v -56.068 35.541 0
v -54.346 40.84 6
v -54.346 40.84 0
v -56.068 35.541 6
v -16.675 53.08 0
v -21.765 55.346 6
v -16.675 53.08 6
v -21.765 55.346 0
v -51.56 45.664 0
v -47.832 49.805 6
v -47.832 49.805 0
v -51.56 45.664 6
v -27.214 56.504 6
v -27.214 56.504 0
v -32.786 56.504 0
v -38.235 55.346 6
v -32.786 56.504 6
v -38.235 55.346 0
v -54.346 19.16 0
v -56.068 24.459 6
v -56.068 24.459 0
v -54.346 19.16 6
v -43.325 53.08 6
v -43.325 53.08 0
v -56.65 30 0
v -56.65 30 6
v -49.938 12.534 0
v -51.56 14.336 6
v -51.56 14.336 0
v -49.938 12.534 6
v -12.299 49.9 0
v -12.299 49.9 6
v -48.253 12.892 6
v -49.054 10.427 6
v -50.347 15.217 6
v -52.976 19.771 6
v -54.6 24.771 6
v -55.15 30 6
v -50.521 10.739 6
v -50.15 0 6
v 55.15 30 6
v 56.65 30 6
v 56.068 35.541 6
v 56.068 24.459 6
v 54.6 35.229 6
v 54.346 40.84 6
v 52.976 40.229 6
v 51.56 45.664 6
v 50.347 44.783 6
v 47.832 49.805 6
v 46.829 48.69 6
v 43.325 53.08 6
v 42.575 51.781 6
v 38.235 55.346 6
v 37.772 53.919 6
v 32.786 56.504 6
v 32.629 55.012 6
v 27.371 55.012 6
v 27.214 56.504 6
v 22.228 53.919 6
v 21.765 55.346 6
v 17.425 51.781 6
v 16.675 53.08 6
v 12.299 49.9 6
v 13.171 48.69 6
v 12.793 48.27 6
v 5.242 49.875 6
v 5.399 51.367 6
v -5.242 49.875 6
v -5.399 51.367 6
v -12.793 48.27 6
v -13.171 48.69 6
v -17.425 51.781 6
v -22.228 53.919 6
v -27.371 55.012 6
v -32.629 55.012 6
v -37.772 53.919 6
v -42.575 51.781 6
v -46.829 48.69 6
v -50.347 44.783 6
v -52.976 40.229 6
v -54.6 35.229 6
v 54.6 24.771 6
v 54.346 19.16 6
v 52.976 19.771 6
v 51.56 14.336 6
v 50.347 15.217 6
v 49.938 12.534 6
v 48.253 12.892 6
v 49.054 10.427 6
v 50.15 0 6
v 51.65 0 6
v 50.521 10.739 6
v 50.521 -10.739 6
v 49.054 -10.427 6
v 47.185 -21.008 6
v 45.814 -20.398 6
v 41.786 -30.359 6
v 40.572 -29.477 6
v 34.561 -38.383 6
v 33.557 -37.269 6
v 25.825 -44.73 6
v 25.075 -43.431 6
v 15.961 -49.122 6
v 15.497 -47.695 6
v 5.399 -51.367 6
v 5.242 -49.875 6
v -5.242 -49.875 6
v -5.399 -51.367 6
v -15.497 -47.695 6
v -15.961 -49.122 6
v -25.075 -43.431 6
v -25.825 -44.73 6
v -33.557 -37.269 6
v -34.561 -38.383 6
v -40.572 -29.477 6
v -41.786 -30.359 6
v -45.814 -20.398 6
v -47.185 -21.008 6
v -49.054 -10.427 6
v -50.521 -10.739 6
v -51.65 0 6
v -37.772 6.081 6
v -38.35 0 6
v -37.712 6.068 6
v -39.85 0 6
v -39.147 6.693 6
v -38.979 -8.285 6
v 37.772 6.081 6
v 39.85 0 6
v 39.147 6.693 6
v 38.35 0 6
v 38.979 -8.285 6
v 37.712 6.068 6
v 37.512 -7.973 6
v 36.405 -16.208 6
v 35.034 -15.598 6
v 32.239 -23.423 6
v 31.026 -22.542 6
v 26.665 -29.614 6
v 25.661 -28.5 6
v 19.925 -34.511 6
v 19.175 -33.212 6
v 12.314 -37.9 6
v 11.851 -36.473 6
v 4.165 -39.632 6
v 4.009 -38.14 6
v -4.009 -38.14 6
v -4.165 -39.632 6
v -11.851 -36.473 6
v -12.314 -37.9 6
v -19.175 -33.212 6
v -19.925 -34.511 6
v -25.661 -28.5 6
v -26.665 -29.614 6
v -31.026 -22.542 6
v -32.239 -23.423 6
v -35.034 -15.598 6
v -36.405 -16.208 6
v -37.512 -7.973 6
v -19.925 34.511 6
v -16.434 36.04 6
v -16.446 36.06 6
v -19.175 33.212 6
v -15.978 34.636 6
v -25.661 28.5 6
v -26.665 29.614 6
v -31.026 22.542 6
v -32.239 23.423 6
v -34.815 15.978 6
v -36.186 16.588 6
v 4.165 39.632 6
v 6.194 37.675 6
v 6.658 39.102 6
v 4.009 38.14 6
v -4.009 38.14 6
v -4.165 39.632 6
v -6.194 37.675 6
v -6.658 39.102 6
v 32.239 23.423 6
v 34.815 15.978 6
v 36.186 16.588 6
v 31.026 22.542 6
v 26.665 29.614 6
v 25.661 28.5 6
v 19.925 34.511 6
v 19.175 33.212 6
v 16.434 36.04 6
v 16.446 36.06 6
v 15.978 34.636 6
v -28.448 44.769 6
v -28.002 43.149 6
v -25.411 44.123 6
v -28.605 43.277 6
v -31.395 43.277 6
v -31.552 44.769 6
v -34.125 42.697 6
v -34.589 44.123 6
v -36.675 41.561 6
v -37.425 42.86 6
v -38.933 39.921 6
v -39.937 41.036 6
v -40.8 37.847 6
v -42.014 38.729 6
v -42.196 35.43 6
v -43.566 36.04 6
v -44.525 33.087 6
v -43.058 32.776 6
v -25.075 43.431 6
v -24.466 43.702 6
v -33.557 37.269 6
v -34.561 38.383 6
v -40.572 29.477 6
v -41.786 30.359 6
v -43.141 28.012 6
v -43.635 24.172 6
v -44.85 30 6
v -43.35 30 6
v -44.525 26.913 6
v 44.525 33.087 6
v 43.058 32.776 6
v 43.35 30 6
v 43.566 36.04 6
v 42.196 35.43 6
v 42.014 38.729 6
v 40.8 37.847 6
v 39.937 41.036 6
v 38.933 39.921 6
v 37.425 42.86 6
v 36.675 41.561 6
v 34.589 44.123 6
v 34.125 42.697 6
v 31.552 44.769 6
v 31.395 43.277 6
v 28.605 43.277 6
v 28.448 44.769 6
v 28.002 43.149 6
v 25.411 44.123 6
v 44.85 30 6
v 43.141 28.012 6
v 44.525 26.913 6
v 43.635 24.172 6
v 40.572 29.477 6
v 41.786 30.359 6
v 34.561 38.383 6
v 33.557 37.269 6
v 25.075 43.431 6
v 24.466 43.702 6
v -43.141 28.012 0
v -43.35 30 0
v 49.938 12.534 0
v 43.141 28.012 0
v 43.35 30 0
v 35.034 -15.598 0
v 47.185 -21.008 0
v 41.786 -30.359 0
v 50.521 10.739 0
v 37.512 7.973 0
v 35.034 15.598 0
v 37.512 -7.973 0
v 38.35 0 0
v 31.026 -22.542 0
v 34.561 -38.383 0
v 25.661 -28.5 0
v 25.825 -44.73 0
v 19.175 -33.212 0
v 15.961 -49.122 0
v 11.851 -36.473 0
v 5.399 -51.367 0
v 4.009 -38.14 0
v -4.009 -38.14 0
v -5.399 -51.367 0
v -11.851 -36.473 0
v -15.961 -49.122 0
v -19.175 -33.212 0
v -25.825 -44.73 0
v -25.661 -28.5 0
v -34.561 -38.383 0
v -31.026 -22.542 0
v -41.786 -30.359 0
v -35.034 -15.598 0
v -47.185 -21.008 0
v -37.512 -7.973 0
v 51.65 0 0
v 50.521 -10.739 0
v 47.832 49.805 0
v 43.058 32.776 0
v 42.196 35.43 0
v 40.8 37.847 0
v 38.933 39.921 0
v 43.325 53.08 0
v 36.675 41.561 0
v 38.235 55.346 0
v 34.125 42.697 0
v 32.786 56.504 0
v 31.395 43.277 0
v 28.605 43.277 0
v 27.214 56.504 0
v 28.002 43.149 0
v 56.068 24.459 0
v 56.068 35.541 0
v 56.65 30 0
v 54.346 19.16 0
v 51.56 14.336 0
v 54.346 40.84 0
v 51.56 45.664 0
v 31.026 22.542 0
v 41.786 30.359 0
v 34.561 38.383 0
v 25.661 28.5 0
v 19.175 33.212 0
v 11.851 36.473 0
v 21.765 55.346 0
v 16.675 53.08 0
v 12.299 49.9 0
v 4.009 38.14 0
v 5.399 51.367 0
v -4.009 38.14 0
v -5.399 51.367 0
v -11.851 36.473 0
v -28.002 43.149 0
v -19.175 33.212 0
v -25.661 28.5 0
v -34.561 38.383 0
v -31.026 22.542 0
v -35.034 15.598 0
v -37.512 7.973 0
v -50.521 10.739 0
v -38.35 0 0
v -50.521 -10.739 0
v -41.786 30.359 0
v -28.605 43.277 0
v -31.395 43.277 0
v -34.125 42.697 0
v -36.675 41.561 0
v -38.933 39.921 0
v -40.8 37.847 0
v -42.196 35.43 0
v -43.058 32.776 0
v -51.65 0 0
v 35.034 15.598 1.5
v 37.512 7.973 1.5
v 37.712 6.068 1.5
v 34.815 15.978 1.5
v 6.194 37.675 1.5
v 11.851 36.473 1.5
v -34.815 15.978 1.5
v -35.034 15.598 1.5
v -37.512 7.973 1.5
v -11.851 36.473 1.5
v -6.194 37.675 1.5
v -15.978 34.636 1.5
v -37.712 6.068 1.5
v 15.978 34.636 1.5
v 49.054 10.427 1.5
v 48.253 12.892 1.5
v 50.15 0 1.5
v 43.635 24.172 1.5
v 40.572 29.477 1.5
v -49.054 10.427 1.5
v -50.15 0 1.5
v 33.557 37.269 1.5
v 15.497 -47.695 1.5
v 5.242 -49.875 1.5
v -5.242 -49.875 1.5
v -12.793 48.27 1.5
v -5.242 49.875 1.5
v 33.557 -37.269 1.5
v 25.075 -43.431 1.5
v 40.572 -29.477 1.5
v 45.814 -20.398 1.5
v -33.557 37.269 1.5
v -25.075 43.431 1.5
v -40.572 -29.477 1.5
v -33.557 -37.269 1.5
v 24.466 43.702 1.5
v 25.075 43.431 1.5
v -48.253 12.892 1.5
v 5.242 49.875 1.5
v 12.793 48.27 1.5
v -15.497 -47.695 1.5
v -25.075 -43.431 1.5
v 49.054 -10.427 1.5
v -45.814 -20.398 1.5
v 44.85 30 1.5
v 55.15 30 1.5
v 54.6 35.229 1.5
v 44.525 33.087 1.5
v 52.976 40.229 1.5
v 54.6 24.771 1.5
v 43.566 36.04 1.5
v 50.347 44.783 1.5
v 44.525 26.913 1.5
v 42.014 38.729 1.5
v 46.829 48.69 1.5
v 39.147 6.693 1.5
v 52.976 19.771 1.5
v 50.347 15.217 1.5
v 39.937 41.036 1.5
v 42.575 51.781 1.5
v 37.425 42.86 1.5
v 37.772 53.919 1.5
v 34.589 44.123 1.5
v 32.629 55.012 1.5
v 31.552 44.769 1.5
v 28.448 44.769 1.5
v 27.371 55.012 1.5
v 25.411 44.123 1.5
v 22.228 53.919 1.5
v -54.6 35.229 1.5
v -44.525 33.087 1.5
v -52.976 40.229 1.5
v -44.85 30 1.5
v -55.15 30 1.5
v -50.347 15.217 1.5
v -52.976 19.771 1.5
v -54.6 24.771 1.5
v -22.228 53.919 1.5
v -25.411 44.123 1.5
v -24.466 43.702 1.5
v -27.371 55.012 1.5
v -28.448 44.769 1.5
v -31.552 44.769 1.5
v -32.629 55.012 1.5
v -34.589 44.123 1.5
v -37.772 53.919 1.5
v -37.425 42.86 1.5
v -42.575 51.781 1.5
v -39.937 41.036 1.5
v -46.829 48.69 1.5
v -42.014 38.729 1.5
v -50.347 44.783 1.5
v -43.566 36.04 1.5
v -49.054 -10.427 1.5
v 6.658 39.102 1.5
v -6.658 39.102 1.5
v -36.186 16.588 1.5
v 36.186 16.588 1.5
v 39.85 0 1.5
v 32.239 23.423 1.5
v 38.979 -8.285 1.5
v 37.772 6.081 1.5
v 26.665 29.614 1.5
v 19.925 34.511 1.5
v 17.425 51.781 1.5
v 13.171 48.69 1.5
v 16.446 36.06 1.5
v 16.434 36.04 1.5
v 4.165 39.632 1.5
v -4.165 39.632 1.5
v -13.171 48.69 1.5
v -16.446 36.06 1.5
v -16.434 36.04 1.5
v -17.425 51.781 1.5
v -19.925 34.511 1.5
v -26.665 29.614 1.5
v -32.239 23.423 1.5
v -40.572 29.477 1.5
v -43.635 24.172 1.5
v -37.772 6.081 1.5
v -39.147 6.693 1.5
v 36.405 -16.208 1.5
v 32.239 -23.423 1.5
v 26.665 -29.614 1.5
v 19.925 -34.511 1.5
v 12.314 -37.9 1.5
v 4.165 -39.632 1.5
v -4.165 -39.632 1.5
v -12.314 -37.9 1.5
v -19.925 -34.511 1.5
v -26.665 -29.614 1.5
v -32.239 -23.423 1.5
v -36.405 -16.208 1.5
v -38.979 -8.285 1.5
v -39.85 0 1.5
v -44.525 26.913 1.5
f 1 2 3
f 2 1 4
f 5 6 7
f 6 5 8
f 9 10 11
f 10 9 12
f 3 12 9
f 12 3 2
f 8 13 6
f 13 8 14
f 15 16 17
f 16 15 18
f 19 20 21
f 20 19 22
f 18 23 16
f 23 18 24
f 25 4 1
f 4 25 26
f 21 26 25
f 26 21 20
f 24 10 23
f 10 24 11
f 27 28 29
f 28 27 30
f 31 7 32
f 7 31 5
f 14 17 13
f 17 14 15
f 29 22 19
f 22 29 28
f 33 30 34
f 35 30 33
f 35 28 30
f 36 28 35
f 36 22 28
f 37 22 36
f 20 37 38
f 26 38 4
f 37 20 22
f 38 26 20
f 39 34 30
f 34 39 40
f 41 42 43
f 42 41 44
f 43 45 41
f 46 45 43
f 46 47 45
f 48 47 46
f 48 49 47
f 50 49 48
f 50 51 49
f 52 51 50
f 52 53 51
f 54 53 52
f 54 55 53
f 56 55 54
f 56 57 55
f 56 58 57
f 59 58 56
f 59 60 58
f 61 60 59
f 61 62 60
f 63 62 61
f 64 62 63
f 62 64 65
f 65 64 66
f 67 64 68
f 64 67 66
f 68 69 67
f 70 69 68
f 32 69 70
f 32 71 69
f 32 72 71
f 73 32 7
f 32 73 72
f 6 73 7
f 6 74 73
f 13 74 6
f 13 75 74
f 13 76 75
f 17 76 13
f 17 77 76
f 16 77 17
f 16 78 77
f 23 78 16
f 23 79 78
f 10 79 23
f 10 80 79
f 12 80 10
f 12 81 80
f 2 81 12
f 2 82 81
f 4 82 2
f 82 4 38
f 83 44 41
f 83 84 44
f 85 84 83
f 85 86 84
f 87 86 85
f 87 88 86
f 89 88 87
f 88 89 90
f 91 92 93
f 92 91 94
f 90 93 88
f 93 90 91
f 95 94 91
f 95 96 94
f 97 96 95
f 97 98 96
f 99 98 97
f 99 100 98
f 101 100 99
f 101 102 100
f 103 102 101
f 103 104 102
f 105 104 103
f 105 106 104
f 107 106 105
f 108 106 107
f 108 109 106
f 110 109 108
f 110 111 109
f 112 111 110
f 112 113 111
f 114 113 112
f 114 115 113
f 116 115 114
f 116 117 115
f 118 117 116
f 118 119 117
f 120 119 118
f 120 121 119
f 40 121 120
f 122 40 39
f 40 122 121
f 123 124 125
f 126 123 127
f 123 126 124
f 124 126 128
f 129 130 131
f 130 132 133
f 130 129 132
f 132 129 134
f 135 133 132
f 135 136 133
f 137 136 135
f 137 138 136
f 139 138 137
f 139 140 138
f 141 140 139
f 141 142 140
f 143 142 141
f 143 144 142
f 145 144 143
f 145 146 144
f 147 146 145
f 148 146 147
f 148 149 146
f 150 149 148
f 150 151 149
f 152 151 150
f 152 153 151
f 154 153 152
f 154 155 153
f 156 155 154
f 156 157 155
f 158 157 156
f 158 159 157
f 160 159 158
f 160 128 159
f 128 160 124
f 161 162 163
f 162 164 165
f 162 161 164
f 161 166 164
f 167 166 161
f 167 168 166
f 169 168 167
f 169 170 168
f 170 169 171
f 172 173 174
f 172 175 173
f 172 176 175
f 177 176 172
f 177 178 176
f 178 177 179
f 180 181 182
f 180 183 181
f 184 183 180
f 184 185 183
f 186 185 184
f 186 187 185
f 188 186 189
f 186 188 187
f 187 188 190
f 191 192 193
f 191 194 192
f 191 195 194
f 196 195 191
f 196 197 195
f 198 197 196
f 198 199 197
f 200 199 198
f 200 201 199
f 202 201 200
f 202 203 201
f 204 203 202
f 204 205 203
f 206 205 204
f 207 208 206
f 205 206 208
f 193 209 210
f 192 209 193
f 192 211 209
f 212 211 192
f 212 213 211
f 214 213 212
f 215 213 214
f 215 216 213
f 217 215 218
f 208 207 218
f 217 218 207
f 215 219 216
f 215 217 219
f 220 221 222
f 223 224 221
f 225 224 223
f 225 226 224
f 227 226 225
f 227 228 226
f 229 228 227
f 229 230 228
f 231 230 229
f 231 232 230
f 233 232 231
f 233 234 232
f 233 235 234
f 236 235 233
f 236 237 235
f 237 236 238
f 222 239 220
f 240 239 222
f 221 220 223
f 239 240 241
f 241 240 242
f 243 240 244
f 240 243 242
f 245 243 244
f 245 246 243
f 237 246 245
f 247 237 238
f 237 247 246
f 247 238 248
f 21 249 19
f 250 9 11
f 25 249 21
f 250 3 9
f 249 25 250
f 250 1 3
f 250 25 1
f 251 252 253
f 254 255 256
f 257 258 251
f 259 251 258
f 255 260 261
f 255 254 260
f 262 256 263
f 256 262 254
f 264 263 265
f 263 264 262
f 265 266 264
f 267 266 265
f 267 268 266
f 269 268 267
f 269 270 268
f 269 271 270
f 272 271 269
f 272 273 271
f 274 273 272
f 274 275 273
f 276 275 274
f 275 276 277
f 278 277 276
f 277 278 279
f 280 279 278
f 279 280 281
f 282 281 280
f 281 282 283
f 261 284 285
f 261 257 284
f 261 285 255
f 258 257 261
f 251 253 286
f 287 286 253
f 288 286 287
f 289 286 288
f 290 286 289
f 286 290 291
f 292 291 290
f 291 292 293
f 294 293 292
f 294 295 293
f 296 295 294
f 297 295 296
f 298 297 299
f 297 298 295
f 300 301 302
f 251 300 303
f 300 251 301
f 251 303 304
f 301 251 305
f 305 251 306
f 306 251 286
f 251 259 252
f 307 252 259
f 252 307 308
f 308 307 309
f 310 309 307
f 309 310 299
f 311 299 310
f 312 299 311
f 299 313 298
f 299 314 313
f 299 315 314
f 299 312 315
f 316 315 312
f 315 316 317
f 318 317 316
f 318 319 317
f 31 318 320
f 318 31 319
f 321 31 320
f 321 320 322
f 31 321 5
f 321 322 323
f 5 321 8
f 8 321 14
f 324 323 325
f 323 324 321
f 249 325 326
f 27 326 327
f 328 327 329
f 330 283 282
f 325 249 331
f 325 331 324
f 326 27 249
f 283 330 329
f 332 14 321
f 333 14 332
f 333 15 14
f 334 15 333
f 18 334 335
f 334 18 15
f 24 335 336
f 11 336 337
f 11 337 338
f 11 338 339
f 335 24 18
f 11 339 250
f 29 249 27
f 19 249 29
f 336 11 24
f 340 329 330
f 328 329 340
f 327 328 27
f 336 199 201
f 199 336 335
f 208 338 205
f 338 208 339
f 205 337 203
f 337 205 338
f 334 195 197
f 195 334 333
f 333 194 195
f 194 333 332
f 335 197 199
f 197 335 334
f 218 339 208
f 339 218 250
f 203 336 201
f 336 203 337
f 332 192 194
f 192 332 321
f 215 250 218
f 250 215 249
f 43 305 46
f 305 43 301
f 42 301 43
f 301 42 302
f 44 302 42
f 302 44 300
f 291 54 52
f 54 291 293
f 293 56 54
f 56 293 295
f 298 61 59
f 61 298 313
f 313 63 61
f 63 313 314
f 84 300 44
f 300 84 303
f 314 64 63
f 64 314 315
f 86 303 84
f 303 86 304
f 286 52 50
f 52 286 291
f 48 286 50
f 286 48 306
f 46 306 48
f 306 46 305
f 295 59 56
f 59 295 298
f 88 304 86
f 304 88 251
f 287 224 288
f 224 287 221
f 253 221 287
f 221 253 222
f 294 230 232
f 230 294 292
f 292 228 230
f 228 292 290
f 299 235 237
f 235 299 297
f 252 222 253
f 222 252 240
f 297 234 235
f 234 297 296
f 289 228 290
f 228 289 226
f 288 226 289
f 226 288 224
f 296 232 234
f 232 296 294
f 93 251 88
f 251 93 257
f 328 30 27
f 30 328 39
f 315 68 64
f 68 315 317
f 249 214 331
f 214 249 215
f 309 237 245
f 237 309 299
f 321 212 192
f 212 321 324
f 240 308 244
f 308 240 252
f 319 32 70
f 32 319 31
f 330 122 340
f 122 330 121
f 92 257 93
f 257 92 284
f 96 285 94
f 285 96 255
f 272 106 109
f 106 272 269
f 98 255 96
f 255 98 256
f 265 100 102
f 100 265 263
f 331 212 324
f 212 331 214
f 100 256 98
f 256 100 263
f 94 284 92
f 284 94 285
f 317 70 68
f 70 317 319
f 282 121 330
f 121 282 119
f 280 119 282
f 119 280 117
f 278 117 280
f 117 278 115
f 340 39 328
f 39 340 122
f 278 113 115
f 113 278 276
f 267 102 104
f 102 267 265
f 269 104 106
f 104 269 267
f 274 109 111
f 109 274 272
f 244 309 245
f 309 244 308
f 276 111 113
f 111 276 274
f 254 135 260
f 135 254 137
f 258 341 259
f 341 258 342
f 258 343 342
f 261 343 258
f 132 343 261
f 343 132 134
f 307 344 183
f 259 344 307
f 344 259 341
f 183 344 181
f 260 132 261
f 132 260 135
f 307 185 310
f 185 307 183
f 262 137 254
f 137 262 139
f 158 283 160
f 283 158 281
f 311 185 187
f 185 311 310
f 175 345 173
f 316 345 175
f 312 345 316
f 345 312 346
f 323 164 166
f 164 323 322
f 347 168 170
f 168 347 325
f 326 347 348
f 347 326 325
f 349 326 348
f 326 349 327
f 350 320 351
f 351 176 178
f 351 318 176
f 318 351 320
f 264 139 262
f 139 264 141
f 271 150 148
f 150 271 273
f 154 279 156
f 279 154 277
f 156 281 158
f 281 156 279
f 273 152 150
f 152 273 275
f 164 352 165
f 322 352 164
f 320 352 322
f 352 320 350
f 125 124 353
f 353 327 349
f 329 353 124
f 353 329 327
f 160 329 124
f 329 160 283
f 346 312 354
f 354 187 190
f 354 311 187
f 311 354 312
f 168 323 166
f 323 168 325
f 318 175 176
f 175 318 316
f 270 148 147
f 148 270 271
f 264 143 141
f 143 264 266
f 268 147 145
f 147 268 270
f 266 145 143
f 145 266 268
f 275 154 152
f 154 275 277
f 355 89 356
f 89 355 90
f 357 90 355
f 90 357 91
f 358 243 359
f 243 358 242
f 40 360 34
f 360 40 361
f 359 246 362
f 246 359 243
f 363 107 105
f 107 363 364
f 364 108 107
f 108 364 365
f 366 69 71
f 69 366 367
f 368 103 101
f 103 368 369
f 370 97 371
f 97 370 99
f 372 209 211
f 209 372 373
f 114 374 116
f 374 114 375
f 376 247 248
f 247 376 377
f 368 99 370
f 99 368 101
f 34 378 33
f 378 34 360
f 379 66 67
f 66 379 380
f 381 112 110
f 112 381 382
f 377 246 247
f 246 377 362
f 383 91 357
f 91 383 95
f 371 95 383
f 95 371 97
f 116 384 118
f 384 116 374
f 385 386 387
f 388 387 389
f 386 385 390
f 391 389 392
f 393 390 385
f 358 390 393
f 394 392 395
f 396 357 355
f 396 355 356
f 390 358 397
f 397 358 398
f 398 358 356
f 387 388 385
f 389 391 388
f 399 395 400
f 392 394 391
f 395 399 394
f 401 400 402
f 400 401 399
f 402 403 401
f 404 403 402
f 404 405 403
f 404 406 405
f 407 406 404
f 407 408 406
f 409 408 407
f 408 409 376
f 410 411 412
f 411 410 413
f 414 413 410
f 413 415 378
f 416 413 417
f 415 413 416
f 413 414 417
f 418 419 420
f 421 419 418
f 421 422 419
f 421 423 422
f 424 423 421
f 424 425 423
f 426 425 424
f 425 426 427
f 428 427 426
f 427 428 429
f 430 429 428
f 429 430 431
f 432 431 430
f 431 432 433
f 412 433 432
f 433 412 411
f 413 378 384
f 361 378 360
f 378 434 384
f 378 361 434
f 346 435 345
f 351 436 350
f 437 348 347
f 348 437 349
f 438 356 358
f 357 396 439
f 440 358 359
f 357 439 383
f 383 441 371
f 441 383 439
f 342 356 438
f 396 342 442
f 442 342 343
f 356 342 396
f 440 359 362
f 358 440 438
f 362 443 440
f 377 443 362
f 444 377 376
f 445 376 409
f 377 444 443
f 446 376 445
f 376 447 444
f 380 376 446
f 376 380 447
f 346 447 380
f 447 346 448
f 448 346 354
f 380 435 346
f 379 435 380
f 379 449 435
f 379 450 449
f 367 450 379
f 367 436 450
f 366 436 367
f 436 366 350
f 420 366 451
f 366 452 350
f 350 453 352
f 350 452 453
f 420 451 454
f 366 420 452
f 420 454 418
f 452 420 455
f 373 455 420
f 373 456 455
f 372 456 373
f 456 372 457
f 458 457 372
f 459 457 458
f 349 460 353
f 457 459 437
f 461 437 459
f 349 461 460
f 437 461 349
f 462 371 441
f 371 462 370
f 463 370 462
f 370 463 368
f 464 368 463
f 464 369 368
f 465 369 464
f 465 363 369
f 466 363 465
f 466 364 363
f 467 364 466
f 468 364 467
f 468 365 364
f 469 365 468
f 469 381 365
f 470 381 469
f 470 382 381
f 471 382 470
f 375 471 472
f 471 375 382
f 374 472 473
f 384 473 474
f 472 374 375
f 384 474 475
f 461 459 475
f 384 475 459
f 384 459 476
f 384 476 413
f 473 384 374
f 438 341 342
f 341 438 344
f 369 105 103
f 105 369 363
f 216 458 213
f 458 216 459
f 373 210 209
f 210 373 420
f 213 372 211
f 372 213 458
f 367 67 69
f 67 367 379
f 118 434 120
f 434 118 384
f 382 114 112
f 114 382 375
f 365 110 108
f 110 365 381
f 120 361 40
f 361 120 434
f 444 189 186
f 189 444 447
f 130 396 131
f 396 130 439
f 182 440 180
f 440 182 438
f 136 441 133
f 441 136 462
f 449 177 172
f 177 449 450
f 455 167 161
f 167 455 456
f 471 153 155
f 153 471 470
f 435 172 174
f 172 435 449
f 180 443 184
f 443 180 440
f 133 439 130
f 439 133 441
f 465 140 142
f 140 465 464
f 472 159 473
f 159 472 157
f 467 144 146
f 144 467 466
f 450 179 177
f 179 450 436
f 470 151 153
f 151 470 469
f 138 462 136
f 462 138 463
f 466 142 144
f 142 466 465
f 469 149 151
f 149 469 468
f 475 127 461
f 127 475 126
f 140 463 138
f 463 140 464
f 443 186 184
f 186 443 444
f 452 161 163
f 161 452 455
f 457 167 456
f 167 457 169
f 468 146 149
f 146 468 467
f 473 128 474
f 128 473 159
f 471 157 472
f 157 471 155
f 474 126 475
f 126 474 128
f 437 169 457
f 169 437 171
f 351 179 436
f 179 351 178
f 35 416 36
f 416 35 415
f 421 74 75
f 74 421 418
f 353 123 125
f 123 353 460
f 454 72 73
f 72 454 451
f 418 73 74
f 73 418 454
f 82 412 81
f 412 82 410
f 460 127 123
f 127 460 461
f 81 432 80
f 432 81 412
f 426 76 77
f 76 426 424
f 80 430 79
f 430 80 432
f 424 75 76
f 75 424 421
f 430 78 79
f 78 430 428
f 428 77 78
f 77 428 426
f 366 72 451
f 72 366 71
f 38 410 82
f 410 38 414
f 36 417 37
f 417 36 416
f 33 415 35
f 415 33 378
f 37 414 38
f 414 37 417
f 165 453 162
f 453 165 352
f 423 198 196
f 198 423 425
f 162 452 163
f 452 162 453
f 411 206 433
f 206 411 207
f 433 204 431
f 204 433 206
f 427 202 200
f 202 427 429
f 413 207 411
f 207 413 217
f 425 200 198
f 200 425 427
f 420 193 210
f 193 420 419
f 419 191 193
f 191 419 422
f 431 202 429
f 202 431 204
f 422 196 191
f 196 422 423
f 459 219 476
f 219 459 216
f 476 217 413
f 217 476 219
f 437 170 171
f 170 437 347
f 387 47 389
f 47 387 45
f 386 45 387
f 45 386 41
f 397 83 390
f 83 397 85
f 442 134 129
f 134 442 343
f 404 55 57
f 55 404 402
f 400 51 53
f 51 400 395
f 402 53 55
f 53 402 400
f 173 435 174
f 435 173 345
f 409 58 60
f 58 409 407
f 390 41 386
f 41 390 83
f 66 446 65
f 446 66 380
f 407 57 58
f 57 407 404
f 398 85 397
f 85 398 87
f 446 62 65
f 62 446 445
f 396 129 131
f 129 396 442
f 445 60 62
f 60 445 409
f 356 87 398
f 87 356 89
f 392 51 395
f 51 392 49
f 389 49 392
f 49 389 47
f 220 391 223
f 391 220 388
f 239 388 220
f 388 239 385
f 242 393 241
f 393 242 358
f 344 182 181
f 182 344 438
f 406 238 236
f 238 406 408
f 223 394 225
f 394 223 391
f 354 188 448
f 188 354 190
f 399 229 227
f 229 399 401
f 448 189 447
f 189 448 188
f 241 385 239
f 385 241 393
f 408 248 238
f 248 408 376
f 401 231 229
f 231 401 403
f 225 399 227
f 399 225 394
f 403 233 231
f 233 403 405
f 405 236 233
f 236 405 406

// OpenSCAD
use <MCAD/regular_shapes.scad>

t = 1.5;
h = 10;

r = 45;
r_ear = 20;

module silhouette(w=10, h=10){
    difference(){
        union(){
            difference(){
                for (x = [-30, 30])
                    translate([x, 30, 0])
                    cylinder_tube(h, r_ear + w/2, w);
                cylinder(h, r + w/2, r + w/2);
            }
            cylinder_tube(h, r + w/2, w);
        }
        union(){
            translate([0, 0, t])
            cylinder_tube(h, r + w/2 - t, w - 2*t);
            for (x = [-30, 30])
                translate([x, 30, t])
                cylinder_tube(h, r_ear + w/2 - t, w-2*t);
        }
    }
}

//silhouette(10, 10);
silhouette(10 + 2*t+ 0.3, 6);
